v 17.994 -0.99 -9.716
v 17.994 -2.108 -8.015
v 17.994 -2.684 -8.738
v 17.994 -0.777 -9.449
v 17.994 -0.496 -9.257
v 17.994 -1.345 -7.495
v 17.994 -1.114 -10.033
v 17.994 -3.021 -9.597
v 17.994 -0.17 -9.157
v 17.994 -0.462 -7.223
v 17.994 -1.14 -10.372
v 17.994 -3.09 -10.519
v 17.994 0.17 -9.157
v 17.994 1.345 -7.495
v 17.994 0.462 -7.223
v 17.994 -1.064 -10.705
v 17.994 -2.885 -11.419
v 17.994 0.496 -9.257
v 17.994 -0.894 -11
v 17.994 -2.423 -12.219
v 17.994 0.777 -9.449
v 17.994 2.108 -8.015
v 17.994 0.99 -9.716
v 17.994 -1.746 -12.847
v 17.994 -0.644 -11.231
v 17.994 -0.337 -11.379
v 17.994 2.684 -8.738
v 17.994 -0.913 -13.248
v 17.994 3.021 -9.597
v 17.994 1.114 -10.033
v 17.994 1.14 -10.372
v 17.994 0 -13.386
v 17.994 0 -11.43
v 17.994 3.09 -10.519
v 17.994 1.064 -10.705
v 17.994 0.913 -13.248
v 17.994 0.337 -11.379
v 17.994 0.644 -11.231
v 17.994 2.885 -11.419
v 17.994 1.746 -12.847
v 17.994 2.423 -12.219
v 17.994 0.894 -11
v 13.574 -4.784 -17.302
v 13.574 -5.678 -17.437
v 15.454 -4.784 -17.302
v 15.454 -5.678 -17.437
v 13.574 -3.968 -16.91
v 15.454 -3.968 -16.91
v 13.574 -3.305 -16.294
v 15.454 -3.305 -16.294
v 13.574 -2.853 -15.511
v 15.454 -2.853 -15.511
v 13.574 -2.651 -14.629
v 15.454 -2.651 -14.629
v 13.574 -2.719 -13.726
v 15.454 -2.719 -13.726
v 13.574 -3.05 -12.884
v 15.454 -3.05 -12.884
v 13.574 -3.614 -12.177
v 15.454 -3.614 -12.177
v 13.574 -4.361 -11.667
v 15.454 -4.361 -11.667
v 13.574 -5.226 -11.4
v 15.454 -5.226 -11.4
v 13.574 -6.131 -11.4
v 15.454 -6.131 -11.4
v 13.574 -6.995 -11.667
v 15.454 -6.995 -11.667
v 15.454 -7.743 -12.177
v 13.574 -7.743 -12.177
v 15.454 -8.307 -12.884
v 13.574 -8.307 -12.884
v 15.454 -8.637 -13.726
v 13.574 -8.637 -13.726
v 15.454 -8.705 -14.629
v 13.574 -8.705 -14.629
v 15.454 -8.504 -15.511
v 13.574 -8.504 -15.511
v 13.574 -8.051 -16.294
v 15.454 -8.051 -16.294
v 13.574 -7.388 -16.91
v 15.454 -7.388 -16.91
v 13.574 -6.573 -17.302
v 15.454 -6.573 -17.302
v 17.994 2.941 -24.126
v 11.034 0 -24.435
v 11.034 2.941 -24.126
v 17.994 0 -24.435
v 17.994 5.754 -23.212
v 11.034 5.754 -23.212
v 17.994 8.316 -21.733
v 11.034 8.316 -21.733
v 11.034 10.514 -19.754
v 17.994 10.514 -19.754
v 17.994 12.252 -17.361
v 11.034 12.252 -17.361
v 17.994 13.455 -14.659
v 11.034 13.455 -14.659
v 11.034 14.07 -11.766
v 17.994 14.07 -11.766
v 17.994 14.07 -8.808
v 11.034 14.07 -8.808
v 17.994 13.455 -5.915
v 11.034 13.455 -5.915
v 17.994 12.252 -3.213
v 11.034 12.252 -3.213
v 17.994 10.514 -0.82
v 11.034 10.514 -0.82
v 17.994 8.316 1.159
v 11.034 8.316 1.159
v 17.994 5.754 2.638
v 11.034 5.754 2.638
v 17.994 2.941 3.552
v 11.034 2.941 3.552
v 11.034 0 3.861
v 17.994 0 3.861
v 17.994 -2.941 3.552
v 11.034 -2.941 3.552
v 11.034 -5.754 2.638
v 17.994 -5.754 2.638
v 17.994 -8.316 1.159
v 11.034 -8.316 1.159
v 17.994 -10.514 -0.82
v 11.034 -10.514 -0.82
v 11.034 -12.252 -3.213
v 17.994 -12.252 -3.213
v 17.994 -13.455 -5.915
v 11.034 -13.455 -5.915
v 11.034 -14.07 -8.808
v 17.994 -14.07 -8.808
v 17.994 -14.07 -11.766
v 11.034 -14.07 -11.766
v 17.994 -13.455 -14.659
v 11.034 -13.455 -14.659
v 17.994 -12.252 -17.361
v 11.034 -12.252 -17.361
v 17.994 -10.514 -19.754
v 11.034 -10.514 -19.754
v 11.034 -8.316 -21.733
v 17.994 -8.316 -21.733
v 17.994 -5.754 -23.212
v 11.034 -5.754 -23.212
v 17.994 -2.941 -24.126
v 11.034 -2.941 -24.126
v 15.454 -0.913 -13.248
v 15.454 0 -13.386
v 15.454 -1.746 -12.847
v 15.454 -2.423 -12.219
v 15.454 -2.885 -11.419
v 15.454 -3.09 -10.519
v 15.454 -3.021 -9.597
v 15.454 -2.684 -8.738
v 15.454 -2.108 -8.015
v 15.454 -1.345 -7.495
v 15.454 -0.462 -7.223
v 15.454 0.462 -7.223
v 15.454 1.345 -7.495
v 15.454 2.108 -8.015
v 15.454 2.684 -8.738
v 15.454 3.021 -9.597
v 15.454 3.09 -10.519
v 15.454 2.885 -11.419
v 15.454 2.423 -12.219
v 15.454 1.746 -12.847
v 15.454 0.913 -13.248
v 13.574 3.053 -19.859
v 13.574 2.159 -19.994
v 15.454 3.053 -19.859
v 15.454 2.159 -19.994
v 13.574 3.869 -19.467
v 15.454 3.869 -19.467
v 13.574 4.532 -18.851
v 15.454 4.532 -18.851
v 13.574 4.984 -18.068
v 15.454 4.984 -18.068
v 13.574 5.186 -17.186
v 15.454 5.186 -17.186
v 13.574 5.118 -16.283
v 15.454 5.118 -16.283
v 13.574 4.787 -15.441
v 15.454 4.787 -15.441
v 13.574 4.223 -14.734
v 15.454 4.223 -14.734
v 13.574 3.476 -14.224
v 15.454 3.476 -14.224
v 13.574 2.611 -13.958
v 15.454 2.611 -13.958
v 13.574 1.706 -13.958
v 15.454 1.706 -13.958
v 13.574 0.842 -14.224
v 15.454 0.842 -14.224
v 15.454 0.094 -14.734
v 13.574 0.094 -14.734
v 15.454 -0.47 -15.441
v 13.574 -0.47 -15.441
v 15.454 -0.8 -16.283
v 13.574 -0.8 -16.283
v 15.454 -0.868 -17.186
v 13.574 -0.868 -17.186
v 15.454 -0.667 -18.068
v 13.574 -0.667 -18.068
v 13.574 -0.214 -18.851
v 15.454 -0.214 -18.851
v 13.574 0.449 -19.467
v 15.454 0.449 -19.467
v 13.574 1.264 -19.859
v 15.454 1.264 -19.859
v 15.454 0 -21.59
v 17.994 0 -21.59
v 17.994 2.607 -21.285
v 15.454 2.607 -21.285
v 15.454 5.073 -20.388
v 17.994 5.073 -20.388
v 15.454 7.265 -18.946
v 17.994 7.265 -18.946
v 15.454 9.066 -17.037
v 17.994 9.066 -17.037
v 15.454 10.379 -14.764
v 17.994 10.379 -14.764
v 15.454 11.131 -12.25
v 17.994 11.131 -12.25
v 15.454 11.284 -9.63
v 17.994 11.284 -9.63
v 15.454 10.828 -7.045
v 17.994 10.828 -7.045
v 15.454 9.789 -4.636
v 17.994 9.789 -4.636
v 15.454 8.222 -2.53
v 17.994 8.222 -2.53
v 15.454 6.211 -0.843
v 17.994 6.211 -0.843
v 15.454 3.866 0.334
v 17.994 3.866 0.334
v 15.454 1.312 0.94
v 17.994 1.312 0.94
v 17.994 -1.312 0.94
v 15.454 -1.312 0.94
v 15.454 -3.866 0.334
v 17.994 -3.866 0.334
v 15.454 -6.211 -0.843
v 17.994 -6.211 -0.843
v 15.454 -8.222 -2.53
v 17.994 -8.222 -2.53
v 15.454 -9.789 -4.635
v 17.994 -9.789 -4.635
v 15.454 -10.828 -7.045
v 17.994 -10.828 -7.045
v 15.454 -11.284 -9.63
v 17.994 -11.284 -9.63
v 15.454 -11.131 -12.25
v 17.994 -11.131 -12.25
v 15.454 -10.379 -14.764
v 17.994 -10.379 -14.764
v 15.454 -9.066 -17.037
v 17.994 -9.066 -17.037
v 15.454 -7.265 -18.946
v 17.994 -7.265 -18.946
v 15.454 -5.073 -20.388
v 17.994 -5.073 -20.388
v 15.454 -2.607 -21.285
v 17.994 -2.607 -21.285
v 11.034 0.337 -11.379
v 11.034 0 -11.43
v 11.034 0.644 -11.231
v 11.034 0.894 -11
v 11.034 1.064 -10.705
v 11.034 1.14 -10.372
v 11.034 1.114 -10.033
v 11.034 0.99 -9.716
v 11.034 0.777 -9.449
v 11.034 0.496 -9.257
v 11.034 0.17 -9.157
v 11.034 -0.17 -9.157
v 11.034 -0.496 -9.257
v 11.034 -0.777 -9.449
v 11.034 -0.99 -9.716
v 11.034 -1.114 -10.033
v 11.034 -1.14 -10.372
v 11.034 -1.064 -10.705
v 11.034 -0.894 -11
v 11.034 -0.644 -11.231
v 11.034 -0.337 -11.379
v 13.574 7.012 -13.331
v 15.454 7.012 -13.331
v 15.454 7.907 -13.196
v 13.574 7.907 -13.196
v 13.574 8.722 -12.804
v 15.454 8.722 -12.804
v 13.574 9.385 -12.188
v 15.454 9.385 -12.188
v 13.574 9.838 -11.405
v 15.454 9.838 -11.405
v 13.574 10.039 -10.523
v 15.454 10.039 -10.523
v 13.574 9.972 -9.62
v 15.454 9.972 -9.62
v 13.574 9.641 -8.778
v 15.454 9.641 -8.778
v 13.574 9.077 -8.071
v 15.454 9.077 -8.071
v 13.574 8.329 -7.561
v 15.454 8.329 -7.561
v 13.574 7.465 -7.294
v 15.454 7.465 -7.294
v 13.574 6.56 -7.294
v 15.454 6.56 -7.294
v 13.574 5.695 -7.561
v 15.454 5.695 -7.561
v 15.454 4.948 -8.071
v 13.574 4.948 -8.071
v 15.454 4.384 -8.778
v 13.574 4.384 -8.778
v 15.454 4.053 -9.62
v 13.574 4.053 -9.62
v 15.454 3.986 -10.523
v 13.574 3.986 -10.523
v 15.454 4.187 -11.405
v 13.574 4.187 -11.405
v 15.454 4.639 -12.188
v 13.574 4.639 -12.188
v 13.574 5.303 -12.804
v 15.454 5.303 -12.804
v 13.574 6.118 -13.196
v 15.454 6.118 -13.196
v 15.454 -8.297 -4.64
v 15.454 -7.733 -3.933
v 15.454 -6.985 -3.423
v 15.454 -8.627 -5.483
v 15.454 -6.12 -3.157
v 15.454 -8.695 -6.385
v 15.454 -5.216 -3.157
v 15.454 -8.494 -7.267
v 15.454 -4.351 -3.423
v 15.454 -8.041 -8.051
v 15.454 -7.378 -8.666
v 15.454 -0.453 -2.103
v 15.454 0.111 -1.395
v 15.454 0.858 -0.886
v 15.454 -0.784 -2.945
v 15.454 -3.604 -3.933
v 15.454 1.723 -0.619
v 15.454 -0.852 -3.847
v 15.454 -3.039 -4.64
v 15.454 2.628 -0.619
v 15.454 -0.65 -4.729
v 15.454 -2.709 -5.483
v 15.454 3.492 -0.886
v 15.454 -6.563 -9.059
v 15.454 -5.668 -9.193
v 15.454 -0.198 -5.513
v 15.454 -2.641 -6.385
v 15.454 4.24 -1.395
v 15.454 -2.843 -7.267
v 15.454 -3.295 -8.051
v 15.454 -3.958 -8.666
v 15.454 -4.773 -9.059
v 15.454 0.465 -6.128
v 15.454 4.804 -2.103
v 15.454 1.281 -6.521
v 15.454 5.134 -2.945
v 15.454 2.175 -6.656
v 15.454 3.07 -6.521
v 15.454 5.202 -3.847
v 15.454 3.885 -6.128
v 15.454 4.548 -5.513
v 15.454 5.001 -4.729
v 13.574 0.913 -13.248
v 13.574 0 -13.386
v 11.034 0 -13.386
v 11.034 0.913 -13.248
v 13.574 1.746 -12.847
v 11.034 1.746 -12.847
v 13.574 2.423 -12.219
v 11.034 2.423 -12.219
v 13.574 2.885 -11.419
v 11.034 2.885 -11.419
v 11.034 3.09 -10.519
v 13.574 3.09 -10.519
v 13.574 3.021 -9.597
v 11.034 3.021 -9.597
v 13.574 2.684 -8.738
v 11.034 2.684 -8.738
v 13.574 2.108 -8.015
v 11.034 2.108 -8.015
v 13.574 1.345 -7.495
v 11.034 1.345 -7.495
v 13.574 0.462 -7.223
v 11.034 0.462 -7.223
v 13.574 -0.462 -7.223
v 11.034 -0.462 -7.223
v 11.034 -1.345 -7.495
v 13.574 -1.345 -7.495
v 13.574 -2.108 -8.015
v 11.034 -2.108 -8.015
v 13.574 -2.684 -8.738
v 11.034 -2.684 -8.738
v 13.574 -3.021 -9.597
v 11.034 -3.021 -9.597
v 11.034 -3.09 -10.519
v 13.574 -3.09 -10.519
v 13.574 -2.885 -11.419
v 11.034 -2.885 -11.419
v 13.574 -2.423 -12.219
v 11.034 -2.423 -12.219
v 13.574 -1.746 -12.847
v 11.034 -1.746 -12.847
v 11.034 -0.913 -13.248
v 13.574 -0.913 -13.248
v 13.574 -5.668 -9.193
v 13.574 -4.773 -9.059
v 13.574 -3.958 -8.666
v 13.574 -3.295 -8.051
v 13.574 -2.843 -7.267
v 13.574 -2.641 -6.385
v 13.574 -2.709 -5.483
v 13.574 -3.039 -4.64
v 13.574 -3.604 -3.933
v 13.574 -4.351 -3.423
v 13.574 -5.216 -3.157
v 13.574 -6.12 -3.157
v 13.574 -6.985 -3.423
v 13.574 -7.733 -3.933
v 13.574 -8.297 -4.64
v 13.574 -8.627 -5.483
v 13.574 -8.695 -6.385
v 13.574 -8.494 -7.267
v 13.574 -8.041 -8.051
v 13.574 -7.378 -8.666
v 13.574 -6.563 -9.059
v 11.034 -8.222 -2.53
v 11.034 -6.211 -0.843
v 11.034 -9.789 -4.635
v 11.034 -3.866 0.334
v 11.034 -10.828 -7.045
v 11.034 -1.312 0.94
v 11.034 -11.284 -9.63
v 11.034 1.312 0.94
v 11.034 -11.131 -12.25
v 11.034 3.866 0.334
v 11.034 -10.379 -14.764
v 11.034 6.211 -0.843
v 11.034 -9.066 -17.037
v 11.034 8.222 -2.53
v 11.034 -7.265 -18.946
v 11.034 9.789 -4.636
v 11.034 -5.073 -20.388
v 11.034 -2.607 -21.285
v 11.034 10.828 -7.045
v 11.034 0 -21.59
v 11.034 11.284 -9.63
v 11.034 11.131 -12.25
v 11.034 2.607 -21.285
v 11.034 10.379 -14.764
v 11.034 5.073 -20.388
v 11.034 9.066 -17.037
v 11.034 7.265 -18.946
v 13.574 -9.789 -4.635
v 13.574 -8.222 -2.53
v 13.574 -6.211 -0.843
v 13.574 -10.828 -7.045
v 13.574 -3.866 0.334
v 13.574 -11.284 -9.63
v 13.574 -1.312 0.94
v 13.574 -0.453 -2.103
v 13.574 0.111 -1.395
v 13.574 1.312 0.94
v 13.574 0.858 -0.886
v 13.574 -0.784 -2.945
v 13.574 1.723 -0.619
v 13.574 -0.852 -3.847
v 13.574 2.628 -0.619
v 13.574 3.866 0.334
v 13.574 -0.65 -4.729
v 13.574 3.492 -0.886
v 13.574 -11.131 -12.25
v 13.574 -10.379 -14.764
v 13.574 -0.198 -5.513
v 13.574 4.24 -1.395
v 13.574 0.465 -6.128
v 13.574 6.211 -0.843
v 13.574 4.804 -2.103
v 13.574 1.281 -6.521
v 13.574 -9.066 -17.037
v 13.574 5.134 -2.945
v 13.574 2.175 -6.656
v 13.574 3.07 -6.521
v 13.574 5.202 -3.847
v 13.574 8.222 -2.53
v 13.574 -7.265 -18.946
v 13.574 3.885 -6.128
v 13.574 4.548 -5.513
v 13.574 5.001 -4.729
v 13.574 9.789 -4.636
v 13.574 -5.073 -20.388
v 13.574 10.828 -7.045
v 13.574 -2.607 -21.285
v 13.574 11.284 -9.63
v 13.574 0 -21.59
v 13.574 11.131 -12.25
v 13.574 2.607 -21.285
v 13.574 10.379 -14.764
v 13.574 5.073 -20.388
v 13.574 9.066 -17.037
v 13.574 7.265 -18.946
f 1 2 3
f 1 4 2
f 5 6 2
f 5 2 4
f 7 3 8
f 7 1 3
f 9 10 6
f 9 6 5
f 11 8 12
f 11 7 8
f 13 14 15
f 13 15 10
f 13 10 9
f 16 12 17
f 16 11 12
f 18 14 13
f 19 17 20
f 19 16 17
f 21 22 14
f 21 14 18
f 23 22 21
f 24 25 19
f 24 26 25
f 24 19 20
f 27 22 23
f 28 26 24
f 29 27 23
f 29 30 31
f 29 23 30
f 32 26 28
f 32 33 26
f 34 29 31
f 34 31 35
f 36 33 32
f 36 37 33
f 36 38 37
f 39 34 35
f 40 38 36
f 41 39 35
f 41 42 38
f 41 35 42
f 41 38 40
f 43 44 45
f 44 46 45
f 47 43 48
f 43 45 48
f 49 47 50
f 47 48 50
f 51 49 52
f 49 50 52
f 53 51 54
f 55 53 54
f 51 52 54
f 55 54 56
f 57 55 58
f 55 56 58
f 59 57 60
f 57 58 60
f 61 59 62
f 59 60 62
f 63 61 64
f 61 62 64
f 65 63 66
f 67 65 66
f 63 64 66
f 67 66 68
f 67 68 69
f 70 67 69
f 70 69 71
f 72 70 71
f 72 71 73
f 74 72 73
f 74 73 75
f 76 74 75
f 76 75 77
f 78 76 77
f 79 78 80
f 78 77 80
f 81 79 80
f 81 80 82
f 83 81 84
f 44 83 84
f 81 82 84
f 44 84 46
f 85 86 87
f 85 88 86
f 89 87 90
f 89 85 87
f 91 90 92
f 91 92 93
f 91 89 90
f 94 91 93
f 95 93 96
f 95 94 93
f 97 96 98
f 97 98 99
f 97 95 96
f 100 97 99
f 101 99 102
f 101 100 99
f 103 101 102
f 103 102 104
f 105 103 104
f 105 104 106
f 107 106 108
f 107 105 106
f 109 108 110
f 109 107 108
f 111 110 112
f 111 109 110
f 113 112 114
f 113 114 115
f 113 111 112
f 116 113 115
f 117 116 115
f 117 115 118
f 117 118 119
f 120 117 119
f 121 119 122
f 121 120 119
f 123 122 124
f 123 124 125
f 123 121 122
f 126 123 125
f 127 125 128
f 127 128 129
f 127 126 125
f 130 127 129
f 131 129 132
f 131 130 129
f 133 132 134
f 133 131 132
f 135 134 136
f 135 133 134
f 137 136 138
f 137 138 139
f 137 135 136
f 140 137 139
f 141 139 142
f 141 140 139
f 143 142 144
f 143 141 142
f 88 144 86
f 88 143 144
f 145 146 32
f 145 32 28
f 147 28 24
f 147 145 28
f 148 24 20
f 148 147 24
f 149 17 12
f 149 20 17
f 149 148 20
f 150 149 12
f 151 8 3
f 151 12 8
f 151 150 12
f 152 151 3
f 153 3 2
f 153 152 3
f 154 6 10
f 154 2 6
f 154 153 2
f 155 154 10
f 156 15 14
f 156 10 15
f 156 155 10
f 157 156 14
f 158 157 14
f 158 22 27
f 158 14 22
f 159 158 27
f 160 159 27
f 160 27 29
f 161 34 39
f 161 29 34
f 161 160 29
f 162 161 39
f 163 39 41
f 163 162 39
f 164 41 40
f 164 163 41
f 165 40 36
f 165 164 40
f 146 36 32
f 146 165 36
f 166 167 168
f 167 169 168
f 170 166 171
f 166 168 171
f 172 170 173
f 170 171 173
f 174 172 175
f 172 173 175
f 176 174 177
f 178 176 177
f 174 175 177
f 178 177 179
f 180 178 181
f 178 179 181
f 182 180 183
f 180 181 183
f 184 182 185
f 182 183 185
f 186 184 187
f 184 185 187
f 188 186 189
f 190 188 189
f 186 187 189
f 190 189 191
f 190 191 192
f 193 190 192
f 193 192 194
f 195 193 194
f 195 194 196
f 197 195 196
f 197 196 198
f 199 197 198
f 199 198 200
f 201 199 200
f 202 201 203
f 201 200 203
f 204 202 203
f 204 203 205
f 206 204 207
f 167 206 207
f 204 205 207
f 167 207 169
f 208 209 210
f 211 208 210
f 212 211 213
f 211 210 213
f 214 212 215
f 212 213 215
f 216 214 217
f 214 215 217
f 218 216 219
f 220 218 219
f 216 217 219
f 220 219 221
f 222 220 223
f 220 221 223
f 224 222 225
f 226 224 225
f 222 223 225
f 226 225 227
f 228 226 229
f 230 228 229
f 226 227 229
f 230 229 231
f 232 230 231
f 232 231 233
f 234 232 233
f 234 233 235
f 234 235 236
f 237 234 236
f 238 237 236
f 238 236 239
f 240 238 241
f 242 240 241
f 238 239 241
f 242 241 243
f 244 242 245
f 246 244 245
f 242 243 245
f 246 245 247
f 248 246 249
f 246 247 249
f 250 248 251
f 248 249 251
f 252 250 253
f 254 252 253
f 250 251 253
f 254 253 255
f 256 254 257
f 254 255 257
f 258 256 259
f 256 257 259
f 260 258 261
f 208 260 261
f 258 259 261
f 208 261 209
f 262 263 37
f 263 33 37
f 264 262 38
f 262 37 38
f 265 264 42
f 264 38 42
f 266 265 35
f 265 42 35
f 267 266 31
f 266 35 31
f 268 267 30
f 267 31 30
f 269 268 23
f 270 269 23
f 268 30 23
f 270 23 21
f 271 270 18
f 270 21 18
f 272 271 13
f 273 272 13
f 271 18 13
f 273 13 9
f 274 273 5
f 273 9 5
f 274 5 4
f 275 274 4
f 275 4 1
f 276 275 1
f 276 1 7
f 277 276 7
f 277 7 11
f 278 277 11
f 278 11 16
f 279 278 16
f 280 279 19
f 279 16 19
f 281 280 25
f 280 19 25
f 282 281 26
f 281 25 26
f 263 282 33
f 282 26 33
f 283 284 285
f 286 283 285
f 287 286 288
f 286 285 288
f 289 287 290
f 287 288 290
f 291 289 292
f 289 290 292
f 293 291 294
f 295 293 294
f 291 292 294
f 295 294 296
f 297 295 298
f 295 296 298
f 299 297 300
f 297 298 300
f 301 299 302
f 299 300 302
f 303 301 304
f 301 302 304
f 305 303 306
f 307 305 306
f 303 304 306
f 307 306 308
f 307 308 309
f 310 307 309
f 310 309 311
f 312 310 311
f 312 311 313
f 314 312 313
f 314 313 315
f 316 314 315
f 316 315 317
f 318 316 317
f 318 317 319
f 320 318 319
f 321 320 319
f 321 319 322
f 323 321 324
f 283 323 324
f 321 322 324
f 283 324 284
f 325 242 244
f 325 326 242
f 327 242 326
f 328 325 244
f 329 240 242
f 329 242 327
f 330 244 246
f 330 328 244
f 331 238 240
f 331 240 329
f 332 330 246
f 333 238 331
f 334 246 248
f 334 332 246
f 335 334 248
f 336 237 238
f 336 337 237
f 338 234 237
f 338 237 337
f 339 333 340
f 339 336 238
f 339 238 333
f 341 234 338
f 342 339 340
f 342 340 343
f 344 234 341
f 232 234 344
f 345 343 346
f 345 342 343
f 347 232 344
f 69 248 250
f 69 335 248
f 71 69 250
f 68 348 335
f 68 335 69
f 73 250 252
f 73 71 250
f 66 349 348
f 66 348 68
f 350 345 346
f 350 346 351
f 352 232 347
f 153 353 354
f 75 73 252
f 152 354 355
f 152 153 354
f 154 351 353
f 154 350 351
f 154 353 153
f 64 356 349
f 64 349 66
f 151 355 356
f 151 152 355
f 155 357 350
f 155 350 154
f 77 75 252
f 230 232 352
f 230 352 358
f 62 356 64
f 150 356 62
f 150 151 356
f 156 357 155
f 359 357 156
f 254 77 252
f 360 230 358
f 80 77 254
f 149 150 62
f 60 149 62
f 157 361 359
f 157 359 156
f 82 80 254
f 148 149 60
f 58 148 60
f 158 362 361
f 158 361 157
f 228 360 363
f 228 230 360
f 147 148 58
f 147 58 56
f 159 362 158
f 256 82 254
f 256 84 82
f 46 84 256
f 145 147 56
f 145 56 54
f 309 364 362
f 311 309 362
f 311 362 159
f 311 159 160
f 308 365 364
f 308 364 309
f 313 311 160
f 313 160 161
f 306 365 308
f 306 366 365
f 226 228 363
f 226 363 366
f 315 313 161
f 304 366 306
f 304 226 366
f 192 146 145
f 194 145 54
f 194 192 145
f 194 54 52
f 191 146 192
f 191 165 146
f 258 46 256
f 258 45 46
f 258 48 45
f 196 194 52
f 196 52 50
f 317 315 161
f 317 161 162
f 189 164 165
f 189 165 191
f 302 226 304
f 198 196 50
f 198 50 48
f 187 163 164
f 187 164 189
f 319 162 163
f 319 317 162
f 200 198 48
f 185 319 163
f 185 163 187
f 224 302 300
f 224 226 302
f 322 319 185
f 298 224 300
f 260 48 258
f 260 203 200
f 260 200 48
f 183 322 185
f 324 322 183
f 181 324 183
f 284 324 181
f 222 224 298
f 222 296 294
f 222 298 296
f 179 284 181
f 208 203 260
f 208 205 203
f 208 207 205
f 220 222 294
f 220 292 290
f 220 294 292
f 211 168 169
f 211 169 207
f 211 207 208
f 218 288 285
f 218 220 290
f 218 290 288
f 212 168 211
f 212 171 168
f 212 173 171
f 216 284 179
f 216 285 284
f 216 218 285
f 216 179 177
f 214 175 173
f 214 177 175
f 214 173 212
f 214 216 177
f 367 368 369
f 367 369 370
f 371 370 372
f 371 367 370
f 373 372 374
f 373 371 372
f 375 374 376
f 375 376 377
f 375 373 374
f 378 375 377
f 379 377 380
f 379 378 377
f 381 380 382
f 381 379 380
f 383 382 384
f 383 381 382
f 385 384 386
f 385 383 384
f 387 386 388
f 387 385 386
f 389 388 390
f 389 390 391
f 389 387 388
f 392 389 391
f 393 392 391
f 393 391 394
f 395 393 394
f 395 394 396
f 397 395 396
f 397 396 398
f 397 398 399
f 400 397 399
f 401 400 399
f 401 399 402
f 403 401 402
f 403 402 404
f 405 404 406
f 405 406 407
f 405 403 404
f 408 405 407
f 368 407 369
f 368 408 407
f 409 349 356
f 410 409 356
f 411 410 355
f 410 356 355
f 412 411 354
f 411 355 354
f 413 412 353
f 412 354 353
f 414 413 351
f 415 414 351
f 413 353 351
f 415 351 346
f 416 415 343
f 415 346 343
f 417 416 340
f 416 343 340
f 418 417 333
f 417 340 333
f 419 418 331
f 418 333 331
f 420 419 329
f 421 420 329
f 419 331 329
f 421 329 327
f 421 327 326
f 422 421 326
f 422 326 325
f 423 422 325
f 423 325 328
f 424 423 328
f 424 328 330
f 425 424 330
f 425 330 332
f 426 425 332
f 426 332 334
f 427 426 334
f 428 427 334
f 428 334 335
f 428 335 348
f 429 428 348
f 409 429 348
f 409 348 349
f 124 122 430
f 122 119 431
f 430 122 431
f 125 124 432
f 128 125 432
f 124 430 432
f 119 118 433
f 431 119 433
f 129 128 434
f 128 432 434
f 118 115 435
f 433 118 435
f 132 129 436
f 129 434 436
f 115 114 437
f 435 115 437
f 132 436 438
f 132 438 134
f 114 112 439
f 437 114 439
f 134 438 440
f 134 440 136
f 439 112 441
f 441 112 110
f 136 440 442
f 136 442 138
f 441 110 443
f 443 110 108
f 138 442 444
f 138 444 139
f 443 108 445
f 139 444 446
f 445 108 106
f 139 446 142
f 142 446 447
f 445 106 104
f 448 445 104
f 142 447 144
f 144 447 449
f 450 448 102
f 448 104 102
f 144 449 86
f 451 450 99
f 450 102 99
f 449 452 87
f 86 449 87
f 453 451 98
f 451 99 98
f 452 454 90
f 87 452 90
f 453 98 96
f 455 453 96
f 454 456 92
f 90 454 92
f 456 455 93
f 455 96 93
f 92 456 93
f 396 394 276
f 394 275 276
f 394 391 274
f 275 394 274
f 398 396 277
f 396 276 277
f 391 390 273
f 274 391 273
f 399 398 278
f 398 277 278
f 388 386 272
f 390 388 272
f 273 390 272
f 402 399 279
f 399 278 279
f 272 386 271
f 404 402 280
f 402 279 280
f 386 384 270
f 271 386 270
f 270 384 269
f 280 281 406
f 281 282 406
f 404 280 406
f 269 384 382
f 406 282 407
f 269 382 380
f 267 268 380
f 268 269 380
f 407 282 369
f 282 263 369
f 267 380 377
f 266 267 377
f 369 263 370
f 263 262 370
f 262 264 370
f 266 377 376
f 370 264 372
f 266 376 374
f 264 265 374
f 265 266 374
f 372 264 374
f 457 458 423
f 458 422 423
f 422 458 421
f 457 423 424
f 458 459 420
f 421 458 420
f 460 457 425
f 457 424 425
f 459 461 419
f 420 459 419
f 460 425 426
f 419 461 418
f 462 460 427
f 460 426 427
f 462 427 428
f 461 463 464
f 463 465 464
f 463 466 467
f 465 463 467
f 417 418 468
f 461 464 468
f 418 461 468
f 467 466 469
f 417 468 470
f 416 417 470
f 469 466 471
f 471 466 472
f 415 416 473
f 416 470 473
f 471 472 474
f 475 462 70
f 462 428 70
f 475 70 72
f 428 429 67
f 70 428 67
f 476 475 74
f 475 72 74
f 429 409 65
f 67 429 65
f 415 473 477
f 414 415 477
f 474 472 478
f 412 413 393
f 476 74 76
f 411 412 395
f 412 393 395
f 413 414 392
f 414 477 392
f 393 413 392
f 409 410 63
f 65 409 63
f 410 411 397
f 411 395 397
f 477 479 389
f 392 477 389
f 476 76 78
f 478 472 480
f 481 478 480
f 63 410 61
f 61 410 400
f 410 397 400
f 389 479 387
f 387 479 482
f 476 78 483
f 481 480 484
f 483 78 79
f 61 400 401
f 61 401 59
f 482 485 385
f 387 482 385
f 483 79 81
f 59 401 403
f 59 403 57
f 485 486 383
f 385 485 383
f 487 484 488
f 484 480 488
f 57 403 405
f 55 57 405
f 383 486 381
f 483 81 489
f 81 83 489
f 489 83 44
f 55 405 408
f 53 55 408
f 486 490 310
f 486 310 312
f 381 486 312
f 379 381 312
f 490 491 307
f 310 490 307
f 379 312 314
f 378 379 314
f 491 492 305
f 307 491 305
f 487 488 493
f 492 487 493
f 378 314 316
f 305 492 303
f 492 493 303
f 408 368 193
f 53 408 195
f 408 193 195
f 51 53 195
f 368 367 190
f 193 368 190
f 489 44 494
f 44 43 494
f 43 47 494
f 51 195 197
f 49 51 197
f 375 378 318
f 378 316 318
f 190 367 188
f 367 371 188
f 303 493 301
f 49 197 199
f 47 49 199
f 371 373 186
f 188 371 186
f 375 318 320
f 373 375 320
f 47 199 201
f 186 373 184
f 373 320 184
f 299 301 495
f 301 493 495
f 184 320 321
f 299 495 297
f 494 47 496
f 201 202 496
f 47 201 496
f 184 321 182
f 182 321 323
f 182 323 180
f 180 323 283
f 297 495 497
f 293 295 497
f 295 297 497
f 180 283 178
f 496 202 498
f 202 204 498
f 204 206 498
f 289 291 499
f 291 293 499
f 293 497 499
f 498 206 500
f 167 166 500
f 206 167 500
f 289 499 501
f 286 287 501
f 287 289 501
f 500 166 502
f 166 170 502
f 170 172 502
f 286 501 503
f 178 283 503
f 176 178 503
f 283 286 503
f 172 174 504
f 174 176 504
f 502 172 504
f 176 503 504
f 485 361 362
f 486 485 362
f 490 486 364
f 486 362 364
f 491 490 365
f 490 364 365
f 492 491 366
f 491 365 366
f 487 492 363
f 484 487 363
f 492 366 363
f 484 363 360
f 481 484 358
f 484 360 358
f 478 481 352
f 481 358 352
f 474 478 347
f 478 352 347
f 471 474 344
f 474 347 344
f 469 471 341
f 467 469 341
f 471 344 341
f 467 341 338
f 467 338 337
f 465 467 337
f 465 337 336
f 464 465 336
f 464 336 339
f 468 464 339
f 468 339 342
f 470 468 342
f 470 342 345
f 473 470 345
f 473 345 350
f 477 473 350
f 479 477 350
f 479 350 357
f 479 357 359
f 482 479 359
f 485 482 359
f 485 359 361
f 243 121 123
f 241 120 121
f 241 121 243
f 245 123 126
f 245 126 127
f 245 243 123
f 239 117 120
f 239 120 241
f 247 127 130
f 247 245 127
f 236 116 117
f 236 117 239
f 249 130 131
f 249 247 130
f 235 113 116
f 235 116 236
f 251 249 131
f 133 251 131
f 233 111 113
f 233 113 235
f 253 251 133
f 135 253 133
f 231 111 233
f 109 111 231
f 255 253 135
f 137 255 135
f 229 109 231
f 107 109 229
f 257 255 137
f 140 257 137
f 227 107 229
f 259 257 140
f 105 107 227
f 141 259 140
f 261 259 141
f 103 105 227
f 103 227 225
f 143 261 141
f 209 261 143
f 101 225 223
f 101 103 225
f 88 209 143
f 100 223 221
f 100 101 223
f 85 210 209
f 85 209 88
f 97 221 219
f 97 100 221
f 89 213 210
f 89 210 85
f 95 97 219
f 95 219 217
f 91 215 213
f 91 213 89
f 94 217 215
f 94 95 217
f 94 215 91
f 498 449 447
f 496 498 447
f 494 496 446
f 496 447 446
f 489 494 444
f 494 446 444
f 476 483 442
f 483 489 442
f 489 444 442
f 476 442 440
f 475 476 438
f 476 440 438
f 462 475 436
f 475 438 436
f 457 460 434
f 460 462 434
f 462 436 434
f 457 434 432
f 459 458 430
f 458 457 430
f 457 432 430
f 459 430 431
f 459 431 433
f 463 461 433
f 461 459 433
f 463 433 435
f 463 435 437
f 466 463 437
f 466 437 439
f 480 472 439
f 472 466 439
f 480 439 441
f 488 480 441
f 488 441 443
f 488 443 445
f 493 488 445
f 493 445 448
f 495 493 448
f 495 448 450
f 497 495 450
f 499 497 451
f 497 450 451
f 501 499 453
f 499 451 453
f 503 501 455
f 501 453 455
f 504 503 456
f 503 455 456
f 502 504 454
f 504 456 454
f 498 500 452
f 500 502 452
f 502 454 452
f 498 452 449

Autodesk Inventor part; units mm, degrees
ref_plane "YZ Plane" through (0, 0, 0) normal (1, 0, 0) x (0, 1, 0)
ref_plane "XZ Plane" through (0, 0, 0) normal (0, 1, 0) x (-1, 0, 0)
ref_plane "XY Plane" through (0, 0, 0) normal (0, 0, 1) x (1, 0, 0)
sketch "Sketch3" plane through (0, 0, 0) normal (0, 1, 0) x (-1, 0, 0)
  line L0 (68.9195, -10.287) -> (-79.2178, -10.287)
  line L1 (-11.0342, -11.43) -> (-17.9938, -11.43)
  line L2 (-17.9938, -11.43) -> (-17.9938, -13.3858)
  line L3 (-11.0342, -11.43) -> (-11.0342, -13.3858)
  line L4 (-11.0342, -13.3858) -> (-13.5742, -13.3858)
  line L5 (-17.9938, -13.3858) -> (-15.4538, -13.3858)
  line L6 (-15.4538, -13.3858) -> (-15.4538, -21.59)
  line L7 (-13.5742, -13.3858) -> (-13.5742, -21.59)
  line L8 (-13.5742, -21.59) -> (-11.0342, -21.59)
  line L9 (-15.4538, -21.59) -> (-17.9938, -21.59)
  line L10 (-17.9938, -21.59) -> (-17.9938, -24.4348)
  line L11 (-11.0342, -21.59) -> (-11.0342, -24.4348)
  line L12 (-11.0342, -24.4348) -> (-17.9938, -24.4348)
  point P0 (0, 0)
  dimension "d10" = 1.143
  dimension "d11" = 6.9596
  dimension "d12" = 1.9558
  dimension "d13" = 2.54
  dimension "d14" = 2.54
  dimension "d15" = 8.2042
  dimension "d16" = 2.8448
revolve "Revolution1" add sketch "Sketch3" angle 360 about axis through (-68.9195, 0, -10.287) along (1, 0, 0)
thread "Thread1" size "3-48 UNC" class "2B" standard "ANSI Unified Screw Threads" full length
sketch "Sketch4" plane through (15.4538, 0, -10.287) normal (1, 0, 0) x (0, 0, -1)
  circle A0 centre (0.0087, 7.0124) radius 3.0353
  circle A1 centre (-6.6665, 2.1752) radius 3.0353
  circle A2 centre (-4.1289, -5.6681) radius 3.0353
  circle A3 centre (4.1148, -5.6783) radius 3.0353
  circle A4 centre (6.6719, 2.1587) radius 3.0353
  point P0 (-10.287, 0)
  point P1 (0, 0)
  dimension "d20" = 6.0706
  dimension "d23" = 360
extrude "Extrusion3" cut sketch "Sketch4" against normal through all
properties part number "fly wheel" material "Iron, Malleable"
